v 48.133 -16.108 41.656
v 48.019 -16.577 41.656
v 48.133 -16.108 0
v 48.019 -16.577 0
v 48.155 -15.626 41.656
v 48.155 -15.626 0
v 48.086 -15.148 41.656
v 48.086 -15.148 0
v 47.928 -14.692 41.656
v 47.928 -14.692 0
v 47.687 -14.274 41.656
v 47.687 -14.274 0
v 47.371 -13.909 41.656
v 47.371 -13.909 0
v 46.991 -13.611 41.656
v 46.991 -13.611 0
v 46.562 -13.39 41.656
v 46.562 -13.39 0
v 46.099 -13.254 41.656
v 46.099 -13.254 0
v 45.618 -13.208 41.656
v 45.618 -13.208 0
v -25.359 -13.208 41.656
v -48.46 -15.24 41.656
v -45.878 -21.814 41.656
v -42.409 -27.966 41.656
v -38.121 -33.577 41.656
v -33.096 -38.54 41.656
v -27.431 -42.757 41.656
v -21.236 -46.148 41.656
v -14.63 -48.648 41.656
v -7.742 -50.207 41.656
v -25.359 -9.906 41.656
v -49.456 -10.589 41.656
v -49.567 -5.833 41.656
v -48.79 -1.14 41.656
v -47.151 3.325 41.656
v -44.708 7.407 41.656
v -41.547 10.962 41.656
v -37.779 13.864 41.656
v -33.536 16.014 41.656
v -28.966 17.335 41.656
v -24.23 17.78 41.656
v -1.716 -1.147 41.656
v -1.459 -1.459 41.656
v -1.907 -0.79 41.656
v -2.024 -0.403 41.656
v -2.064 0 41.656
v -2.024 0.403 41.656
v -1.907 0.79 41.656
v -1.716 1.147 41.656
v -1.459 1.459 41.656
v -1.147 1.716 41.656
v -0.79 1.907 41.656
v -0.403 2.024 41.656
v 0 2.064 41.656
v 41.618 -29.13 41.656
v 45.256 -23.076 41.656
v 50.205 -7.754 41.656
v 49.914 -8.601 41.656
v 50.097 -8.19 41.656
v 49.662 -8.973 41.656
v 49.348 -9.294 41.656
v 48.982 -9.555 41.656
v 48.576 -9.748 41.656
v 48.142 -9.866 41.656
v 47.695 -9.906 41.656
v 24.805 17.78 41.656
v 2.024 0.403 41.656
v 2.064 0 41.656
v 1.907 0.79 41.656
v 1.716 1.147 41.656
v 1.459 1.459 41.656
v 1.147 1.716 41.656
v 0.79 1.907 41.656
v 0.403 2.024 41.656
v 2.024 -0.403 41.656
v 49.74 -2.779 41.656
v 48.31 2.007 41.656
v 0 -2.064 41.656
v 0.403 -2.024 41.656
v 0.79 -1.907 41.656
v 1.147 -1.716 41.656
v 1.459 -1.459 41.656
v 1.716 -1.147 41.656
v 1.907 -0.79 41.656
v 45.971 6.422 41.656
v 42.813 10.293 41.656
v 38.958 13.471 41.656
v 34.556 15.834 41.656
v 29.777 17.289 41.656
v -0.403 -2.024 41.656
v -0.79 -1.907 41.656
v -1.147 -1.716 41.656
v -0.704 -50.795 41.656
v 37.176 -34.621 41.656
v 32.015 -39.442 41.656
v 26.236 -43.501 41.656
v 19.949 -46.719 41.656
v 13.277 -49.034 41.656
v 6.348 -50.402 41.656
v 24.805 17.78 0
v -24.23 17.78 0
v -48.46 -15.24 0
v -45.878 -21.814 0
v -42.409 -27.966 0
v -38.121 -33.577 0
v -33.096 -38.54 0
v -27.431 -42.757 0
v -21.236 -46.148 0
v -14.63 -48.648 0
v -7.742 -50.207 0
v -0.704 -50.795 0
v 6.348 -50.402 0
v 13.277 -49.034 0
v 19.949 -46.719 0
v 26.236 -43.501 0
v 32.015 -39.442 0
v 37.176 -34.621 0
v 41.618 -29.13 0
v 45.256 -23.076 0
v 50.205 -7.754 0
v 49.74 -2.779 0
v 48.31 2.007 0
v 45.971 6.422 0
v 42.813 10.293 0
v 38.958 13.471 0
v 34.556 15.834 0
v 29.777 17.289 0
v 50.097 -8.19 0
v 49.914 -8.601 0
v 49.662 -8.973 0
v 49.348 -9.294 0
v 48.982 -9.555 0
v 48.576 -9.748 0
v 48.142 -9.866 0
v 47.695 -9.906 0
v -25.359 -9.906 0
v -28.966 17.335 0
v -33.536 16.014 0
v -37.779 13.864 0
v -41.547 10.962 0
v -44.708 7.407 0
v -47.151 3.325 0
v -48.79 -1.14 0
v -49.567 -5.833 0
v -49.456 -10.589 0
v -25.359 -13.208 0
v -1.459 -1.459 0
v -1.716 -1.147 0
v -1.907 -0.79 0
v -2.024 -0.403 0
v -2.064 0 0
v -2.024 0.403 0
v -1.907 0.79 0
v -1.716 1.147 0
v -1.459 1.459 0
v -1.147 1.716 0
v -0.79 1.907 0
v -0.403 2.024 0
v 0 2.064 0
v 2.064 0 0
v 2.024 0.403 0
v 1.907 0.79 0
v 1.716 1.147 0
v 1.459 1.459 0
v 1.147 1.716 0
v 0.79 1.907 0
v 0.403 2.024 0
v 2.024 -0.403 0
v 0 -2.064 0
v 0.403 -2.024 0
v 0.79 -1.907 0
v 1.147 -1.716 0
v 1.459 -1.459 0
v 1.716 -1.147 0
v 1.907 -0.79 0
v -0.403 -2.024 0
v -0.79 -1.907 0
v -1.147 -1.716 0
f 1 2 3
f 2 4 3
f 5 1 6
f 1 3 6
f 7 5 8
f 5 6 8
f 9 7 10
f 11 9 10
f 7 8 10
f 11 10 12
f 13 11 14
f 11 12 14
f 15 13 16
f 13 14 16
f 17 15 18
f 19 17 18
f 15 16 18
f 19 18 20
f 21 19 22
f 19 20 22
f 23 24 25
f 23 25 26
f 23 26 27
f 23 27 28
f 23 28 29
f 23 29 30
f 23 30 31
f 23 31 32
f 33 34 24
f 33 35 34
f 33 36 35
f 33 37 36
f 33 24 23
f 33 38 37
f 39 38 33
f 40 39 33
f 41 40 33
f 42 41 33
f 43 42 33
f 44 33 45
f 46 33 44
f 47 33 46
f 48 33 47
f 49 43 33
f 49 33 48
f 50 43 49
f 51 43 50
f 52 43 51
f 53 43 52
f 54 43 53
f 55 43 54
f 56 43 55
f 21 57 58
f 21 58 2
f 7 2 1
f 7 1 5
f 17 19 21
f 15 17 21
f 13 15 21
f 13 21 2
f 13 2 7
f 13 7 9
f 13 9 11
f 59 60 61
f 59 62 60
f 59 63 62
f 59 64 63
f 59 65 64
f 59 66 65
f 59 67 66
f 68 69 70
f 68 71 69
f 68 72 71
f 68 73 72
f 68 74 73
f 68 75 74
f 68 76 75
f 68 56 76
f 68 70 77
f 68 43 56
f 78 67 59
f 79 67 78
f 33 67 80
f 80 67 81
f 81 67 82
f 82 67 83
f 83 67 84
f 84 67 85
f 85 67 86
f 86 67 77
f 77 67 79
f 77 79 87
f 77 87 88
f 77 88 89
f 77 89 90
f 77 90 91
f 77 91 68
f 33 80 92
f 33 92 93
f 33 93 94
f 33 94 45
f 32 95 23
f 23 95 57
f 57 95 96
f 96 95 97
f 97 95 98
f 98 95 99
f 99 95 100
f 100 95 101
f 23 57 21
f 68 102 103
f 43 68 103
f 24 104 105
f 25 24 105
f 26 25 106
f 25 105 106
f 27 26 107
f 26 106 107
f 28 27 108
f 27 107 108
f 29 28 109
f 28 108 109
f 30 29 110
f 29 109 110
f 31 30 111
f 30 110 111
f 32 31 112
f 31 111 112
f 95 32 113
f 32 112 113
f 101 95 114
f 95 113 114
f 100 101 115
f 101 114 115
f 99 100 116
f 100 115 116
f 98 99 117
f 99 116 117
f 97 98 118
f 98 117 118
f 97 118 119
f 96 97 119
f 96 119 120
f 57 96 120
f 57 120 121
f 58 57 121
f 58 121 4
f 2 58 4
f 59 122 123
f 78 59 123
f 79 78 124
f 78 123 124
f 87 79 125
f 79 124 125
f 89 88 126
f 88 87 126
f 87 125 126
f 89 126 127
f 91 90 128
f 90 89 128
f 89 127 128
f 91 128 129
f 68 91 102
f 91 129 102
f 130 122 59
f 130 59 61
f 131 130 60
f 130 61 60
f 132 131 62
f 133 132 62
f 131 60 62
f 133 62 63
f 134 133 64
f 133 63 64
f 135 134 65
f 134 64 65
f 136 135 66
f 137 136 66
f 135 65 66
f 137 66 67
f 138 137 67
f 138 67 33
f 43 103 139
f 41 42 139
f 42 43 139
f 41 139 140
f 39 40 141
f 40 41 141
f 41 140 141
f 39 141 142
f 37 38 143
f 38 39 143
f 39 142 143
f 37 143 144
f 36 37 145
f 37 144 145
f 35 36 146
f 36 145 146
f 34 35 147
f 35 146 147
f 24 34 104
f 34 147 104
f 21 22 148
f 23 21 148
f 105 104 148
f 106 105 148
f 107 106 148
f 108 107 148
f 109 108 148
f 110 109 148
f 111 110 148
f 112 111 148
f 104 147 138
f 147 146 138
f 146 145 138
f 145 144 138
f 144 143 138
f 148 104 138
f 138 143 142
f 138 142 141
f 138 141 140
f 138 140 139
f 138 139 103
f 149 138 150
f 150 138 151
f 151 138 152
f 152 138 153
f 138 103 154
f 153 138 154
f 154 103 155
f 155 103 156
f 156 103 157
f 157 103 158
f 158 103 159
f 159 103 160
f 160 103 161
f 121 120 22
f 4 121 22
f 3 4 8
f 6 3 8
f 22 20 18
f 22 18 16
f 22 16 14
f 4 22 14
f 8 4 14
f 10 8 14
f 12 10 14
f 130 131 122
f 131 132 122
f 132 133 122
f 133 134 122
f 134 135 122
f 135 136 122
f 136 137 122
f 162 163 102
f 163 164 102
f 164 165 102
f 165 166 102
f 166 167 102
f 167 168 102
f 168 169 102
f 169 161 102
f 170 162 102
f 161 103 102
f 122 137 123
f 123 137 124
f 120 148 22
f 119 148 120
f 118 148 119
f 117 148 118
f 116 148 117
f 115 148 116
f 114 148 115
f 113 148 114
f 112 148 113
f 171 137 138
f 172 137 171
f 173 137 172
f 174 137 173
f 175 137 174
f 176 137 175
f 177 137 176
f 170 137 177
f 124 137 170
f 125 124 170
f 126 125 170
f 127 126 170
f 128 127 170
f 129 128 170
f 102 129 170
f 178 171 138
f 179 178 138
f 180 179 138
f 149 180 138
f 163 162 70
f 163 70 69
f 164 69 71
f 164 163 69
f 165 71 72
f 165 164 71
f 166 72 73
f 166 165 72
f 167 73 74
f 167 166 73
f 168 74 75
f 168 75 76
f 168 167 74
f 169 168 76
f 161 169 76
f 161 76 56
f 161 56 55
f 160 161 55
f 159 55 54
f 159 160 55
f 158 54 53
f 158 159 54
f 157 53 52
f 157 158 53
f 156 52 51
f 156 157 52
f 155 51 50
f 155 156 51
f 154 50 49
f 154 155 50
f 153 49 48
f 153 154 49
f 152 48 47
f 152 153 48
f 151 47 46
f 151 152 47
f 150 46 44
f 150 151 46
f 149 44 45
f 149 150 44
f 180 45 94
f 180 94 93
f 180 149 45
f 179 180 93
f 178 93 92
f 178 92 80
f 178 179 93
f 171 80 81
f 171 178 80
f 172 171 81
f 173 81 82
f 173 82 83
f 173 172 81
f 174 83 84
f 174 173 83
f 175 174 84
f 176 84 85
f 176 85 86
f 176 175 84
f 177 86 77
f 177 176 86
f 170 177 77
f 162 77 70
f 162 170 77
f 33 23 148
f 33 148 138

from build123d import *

# Parameters (mm, degrees)
SKETCH1_R           = 50.8
SKETCH1_R_2         = 2.06375
BOSS_EXTRUDE1_DEPTH = 41.656
SKETCH2_W           = 75.184
SKETCH2_H           = 3.302
SKETCH2_W_2         = 95.173769496
SKETCH2_H_2         = 48.323916003
CUT_EXTRUDE6_DEPTH  = 76.2
FILLET1_R           = 2.54
FILLET3_R           = 25.4


with BuildPart() as part:
    # Sketch1 → Boss-Extrude1 (new body)
    with BuildSketch(Plane.XY):
        Circle(SKETCH1_R)
        Circle(SKETCH1_R_2, mode=Mode.SUBTRACT)
    extrude(amount=BOSS_EXTRUDE1_DEPTH)

    # Sketch2 → Cut-Extrude6 (cut)
    with BuildSketch(Plane(origin=(0, 0, 0), x_dir=(-1, 0, 0), z_dir=(0, 0, -1))):
        with Locations((-12.232804706, -11.557)):
            Rectangle(SKETCH2_W, SKETCH2_H)
        with Locations((0, 41.941958002)):
            Rectangle(SKETCH2_W_2, SKETCH2_H_2)
    extrude(amount=-CUT_EXTRUDE6_DEPTH, mode=Mode.SUBTRACT)

    # Fillet1
    fillet1_edges = [part.edges().sort_by_distance(p)[0] for p in [
        (49.052917711, -13.208, 20.828),
        (49.824804706, -9.906, 20.828),
    ]]
    fillet(fillet1_edges, radius=FILLET1_R)

    # Fillet3
    # the kernel refuses this fillet: 25.4 mm, written as the material it takes off along each edge
    with BuildSketch(Plane(origin=(47.586884748, 17.78, -64.168841163), x_dir=(0.1019926357447357, -0.9947851538165624, 0), z_dir=(0, 0, 1))) as fillet3_piece_1:
        with BuildLine():
            CenterArc((22.943972331, -25.253558134), FILLET3_R, 83.844514986, 90.301558127)
            Line((-2.323570576, -22.662945186), (0, 0))
            ThreePointArc((0, 0), (12.833768233, 1.647844473), (25.667536465, 0))
        make_face()
    extrude(amount=169.993682325, mode=Mode.SUBTRACT)
    with BuildSketch(Plane(origin=(-47.586884748, 17.78, -82.578860977), x_dir=(1, 0, 0), z_dir=(0, 0, 1))) as fillet3_piece_2:
        with BuildLine():
            CenterArc((23.356829032, -25.4), FILLET3_R, 90, 107.457603124)
            ThreePointArc((-0.873226684, -33.02), (-3.195360858, -16.437043854), (0, 0))
            Line((0, 0), (23.356829032, 0))
        make_face()
    extrude(amount=206.813721954, mode=Mode.SUBTRACT)


solid = part.part
